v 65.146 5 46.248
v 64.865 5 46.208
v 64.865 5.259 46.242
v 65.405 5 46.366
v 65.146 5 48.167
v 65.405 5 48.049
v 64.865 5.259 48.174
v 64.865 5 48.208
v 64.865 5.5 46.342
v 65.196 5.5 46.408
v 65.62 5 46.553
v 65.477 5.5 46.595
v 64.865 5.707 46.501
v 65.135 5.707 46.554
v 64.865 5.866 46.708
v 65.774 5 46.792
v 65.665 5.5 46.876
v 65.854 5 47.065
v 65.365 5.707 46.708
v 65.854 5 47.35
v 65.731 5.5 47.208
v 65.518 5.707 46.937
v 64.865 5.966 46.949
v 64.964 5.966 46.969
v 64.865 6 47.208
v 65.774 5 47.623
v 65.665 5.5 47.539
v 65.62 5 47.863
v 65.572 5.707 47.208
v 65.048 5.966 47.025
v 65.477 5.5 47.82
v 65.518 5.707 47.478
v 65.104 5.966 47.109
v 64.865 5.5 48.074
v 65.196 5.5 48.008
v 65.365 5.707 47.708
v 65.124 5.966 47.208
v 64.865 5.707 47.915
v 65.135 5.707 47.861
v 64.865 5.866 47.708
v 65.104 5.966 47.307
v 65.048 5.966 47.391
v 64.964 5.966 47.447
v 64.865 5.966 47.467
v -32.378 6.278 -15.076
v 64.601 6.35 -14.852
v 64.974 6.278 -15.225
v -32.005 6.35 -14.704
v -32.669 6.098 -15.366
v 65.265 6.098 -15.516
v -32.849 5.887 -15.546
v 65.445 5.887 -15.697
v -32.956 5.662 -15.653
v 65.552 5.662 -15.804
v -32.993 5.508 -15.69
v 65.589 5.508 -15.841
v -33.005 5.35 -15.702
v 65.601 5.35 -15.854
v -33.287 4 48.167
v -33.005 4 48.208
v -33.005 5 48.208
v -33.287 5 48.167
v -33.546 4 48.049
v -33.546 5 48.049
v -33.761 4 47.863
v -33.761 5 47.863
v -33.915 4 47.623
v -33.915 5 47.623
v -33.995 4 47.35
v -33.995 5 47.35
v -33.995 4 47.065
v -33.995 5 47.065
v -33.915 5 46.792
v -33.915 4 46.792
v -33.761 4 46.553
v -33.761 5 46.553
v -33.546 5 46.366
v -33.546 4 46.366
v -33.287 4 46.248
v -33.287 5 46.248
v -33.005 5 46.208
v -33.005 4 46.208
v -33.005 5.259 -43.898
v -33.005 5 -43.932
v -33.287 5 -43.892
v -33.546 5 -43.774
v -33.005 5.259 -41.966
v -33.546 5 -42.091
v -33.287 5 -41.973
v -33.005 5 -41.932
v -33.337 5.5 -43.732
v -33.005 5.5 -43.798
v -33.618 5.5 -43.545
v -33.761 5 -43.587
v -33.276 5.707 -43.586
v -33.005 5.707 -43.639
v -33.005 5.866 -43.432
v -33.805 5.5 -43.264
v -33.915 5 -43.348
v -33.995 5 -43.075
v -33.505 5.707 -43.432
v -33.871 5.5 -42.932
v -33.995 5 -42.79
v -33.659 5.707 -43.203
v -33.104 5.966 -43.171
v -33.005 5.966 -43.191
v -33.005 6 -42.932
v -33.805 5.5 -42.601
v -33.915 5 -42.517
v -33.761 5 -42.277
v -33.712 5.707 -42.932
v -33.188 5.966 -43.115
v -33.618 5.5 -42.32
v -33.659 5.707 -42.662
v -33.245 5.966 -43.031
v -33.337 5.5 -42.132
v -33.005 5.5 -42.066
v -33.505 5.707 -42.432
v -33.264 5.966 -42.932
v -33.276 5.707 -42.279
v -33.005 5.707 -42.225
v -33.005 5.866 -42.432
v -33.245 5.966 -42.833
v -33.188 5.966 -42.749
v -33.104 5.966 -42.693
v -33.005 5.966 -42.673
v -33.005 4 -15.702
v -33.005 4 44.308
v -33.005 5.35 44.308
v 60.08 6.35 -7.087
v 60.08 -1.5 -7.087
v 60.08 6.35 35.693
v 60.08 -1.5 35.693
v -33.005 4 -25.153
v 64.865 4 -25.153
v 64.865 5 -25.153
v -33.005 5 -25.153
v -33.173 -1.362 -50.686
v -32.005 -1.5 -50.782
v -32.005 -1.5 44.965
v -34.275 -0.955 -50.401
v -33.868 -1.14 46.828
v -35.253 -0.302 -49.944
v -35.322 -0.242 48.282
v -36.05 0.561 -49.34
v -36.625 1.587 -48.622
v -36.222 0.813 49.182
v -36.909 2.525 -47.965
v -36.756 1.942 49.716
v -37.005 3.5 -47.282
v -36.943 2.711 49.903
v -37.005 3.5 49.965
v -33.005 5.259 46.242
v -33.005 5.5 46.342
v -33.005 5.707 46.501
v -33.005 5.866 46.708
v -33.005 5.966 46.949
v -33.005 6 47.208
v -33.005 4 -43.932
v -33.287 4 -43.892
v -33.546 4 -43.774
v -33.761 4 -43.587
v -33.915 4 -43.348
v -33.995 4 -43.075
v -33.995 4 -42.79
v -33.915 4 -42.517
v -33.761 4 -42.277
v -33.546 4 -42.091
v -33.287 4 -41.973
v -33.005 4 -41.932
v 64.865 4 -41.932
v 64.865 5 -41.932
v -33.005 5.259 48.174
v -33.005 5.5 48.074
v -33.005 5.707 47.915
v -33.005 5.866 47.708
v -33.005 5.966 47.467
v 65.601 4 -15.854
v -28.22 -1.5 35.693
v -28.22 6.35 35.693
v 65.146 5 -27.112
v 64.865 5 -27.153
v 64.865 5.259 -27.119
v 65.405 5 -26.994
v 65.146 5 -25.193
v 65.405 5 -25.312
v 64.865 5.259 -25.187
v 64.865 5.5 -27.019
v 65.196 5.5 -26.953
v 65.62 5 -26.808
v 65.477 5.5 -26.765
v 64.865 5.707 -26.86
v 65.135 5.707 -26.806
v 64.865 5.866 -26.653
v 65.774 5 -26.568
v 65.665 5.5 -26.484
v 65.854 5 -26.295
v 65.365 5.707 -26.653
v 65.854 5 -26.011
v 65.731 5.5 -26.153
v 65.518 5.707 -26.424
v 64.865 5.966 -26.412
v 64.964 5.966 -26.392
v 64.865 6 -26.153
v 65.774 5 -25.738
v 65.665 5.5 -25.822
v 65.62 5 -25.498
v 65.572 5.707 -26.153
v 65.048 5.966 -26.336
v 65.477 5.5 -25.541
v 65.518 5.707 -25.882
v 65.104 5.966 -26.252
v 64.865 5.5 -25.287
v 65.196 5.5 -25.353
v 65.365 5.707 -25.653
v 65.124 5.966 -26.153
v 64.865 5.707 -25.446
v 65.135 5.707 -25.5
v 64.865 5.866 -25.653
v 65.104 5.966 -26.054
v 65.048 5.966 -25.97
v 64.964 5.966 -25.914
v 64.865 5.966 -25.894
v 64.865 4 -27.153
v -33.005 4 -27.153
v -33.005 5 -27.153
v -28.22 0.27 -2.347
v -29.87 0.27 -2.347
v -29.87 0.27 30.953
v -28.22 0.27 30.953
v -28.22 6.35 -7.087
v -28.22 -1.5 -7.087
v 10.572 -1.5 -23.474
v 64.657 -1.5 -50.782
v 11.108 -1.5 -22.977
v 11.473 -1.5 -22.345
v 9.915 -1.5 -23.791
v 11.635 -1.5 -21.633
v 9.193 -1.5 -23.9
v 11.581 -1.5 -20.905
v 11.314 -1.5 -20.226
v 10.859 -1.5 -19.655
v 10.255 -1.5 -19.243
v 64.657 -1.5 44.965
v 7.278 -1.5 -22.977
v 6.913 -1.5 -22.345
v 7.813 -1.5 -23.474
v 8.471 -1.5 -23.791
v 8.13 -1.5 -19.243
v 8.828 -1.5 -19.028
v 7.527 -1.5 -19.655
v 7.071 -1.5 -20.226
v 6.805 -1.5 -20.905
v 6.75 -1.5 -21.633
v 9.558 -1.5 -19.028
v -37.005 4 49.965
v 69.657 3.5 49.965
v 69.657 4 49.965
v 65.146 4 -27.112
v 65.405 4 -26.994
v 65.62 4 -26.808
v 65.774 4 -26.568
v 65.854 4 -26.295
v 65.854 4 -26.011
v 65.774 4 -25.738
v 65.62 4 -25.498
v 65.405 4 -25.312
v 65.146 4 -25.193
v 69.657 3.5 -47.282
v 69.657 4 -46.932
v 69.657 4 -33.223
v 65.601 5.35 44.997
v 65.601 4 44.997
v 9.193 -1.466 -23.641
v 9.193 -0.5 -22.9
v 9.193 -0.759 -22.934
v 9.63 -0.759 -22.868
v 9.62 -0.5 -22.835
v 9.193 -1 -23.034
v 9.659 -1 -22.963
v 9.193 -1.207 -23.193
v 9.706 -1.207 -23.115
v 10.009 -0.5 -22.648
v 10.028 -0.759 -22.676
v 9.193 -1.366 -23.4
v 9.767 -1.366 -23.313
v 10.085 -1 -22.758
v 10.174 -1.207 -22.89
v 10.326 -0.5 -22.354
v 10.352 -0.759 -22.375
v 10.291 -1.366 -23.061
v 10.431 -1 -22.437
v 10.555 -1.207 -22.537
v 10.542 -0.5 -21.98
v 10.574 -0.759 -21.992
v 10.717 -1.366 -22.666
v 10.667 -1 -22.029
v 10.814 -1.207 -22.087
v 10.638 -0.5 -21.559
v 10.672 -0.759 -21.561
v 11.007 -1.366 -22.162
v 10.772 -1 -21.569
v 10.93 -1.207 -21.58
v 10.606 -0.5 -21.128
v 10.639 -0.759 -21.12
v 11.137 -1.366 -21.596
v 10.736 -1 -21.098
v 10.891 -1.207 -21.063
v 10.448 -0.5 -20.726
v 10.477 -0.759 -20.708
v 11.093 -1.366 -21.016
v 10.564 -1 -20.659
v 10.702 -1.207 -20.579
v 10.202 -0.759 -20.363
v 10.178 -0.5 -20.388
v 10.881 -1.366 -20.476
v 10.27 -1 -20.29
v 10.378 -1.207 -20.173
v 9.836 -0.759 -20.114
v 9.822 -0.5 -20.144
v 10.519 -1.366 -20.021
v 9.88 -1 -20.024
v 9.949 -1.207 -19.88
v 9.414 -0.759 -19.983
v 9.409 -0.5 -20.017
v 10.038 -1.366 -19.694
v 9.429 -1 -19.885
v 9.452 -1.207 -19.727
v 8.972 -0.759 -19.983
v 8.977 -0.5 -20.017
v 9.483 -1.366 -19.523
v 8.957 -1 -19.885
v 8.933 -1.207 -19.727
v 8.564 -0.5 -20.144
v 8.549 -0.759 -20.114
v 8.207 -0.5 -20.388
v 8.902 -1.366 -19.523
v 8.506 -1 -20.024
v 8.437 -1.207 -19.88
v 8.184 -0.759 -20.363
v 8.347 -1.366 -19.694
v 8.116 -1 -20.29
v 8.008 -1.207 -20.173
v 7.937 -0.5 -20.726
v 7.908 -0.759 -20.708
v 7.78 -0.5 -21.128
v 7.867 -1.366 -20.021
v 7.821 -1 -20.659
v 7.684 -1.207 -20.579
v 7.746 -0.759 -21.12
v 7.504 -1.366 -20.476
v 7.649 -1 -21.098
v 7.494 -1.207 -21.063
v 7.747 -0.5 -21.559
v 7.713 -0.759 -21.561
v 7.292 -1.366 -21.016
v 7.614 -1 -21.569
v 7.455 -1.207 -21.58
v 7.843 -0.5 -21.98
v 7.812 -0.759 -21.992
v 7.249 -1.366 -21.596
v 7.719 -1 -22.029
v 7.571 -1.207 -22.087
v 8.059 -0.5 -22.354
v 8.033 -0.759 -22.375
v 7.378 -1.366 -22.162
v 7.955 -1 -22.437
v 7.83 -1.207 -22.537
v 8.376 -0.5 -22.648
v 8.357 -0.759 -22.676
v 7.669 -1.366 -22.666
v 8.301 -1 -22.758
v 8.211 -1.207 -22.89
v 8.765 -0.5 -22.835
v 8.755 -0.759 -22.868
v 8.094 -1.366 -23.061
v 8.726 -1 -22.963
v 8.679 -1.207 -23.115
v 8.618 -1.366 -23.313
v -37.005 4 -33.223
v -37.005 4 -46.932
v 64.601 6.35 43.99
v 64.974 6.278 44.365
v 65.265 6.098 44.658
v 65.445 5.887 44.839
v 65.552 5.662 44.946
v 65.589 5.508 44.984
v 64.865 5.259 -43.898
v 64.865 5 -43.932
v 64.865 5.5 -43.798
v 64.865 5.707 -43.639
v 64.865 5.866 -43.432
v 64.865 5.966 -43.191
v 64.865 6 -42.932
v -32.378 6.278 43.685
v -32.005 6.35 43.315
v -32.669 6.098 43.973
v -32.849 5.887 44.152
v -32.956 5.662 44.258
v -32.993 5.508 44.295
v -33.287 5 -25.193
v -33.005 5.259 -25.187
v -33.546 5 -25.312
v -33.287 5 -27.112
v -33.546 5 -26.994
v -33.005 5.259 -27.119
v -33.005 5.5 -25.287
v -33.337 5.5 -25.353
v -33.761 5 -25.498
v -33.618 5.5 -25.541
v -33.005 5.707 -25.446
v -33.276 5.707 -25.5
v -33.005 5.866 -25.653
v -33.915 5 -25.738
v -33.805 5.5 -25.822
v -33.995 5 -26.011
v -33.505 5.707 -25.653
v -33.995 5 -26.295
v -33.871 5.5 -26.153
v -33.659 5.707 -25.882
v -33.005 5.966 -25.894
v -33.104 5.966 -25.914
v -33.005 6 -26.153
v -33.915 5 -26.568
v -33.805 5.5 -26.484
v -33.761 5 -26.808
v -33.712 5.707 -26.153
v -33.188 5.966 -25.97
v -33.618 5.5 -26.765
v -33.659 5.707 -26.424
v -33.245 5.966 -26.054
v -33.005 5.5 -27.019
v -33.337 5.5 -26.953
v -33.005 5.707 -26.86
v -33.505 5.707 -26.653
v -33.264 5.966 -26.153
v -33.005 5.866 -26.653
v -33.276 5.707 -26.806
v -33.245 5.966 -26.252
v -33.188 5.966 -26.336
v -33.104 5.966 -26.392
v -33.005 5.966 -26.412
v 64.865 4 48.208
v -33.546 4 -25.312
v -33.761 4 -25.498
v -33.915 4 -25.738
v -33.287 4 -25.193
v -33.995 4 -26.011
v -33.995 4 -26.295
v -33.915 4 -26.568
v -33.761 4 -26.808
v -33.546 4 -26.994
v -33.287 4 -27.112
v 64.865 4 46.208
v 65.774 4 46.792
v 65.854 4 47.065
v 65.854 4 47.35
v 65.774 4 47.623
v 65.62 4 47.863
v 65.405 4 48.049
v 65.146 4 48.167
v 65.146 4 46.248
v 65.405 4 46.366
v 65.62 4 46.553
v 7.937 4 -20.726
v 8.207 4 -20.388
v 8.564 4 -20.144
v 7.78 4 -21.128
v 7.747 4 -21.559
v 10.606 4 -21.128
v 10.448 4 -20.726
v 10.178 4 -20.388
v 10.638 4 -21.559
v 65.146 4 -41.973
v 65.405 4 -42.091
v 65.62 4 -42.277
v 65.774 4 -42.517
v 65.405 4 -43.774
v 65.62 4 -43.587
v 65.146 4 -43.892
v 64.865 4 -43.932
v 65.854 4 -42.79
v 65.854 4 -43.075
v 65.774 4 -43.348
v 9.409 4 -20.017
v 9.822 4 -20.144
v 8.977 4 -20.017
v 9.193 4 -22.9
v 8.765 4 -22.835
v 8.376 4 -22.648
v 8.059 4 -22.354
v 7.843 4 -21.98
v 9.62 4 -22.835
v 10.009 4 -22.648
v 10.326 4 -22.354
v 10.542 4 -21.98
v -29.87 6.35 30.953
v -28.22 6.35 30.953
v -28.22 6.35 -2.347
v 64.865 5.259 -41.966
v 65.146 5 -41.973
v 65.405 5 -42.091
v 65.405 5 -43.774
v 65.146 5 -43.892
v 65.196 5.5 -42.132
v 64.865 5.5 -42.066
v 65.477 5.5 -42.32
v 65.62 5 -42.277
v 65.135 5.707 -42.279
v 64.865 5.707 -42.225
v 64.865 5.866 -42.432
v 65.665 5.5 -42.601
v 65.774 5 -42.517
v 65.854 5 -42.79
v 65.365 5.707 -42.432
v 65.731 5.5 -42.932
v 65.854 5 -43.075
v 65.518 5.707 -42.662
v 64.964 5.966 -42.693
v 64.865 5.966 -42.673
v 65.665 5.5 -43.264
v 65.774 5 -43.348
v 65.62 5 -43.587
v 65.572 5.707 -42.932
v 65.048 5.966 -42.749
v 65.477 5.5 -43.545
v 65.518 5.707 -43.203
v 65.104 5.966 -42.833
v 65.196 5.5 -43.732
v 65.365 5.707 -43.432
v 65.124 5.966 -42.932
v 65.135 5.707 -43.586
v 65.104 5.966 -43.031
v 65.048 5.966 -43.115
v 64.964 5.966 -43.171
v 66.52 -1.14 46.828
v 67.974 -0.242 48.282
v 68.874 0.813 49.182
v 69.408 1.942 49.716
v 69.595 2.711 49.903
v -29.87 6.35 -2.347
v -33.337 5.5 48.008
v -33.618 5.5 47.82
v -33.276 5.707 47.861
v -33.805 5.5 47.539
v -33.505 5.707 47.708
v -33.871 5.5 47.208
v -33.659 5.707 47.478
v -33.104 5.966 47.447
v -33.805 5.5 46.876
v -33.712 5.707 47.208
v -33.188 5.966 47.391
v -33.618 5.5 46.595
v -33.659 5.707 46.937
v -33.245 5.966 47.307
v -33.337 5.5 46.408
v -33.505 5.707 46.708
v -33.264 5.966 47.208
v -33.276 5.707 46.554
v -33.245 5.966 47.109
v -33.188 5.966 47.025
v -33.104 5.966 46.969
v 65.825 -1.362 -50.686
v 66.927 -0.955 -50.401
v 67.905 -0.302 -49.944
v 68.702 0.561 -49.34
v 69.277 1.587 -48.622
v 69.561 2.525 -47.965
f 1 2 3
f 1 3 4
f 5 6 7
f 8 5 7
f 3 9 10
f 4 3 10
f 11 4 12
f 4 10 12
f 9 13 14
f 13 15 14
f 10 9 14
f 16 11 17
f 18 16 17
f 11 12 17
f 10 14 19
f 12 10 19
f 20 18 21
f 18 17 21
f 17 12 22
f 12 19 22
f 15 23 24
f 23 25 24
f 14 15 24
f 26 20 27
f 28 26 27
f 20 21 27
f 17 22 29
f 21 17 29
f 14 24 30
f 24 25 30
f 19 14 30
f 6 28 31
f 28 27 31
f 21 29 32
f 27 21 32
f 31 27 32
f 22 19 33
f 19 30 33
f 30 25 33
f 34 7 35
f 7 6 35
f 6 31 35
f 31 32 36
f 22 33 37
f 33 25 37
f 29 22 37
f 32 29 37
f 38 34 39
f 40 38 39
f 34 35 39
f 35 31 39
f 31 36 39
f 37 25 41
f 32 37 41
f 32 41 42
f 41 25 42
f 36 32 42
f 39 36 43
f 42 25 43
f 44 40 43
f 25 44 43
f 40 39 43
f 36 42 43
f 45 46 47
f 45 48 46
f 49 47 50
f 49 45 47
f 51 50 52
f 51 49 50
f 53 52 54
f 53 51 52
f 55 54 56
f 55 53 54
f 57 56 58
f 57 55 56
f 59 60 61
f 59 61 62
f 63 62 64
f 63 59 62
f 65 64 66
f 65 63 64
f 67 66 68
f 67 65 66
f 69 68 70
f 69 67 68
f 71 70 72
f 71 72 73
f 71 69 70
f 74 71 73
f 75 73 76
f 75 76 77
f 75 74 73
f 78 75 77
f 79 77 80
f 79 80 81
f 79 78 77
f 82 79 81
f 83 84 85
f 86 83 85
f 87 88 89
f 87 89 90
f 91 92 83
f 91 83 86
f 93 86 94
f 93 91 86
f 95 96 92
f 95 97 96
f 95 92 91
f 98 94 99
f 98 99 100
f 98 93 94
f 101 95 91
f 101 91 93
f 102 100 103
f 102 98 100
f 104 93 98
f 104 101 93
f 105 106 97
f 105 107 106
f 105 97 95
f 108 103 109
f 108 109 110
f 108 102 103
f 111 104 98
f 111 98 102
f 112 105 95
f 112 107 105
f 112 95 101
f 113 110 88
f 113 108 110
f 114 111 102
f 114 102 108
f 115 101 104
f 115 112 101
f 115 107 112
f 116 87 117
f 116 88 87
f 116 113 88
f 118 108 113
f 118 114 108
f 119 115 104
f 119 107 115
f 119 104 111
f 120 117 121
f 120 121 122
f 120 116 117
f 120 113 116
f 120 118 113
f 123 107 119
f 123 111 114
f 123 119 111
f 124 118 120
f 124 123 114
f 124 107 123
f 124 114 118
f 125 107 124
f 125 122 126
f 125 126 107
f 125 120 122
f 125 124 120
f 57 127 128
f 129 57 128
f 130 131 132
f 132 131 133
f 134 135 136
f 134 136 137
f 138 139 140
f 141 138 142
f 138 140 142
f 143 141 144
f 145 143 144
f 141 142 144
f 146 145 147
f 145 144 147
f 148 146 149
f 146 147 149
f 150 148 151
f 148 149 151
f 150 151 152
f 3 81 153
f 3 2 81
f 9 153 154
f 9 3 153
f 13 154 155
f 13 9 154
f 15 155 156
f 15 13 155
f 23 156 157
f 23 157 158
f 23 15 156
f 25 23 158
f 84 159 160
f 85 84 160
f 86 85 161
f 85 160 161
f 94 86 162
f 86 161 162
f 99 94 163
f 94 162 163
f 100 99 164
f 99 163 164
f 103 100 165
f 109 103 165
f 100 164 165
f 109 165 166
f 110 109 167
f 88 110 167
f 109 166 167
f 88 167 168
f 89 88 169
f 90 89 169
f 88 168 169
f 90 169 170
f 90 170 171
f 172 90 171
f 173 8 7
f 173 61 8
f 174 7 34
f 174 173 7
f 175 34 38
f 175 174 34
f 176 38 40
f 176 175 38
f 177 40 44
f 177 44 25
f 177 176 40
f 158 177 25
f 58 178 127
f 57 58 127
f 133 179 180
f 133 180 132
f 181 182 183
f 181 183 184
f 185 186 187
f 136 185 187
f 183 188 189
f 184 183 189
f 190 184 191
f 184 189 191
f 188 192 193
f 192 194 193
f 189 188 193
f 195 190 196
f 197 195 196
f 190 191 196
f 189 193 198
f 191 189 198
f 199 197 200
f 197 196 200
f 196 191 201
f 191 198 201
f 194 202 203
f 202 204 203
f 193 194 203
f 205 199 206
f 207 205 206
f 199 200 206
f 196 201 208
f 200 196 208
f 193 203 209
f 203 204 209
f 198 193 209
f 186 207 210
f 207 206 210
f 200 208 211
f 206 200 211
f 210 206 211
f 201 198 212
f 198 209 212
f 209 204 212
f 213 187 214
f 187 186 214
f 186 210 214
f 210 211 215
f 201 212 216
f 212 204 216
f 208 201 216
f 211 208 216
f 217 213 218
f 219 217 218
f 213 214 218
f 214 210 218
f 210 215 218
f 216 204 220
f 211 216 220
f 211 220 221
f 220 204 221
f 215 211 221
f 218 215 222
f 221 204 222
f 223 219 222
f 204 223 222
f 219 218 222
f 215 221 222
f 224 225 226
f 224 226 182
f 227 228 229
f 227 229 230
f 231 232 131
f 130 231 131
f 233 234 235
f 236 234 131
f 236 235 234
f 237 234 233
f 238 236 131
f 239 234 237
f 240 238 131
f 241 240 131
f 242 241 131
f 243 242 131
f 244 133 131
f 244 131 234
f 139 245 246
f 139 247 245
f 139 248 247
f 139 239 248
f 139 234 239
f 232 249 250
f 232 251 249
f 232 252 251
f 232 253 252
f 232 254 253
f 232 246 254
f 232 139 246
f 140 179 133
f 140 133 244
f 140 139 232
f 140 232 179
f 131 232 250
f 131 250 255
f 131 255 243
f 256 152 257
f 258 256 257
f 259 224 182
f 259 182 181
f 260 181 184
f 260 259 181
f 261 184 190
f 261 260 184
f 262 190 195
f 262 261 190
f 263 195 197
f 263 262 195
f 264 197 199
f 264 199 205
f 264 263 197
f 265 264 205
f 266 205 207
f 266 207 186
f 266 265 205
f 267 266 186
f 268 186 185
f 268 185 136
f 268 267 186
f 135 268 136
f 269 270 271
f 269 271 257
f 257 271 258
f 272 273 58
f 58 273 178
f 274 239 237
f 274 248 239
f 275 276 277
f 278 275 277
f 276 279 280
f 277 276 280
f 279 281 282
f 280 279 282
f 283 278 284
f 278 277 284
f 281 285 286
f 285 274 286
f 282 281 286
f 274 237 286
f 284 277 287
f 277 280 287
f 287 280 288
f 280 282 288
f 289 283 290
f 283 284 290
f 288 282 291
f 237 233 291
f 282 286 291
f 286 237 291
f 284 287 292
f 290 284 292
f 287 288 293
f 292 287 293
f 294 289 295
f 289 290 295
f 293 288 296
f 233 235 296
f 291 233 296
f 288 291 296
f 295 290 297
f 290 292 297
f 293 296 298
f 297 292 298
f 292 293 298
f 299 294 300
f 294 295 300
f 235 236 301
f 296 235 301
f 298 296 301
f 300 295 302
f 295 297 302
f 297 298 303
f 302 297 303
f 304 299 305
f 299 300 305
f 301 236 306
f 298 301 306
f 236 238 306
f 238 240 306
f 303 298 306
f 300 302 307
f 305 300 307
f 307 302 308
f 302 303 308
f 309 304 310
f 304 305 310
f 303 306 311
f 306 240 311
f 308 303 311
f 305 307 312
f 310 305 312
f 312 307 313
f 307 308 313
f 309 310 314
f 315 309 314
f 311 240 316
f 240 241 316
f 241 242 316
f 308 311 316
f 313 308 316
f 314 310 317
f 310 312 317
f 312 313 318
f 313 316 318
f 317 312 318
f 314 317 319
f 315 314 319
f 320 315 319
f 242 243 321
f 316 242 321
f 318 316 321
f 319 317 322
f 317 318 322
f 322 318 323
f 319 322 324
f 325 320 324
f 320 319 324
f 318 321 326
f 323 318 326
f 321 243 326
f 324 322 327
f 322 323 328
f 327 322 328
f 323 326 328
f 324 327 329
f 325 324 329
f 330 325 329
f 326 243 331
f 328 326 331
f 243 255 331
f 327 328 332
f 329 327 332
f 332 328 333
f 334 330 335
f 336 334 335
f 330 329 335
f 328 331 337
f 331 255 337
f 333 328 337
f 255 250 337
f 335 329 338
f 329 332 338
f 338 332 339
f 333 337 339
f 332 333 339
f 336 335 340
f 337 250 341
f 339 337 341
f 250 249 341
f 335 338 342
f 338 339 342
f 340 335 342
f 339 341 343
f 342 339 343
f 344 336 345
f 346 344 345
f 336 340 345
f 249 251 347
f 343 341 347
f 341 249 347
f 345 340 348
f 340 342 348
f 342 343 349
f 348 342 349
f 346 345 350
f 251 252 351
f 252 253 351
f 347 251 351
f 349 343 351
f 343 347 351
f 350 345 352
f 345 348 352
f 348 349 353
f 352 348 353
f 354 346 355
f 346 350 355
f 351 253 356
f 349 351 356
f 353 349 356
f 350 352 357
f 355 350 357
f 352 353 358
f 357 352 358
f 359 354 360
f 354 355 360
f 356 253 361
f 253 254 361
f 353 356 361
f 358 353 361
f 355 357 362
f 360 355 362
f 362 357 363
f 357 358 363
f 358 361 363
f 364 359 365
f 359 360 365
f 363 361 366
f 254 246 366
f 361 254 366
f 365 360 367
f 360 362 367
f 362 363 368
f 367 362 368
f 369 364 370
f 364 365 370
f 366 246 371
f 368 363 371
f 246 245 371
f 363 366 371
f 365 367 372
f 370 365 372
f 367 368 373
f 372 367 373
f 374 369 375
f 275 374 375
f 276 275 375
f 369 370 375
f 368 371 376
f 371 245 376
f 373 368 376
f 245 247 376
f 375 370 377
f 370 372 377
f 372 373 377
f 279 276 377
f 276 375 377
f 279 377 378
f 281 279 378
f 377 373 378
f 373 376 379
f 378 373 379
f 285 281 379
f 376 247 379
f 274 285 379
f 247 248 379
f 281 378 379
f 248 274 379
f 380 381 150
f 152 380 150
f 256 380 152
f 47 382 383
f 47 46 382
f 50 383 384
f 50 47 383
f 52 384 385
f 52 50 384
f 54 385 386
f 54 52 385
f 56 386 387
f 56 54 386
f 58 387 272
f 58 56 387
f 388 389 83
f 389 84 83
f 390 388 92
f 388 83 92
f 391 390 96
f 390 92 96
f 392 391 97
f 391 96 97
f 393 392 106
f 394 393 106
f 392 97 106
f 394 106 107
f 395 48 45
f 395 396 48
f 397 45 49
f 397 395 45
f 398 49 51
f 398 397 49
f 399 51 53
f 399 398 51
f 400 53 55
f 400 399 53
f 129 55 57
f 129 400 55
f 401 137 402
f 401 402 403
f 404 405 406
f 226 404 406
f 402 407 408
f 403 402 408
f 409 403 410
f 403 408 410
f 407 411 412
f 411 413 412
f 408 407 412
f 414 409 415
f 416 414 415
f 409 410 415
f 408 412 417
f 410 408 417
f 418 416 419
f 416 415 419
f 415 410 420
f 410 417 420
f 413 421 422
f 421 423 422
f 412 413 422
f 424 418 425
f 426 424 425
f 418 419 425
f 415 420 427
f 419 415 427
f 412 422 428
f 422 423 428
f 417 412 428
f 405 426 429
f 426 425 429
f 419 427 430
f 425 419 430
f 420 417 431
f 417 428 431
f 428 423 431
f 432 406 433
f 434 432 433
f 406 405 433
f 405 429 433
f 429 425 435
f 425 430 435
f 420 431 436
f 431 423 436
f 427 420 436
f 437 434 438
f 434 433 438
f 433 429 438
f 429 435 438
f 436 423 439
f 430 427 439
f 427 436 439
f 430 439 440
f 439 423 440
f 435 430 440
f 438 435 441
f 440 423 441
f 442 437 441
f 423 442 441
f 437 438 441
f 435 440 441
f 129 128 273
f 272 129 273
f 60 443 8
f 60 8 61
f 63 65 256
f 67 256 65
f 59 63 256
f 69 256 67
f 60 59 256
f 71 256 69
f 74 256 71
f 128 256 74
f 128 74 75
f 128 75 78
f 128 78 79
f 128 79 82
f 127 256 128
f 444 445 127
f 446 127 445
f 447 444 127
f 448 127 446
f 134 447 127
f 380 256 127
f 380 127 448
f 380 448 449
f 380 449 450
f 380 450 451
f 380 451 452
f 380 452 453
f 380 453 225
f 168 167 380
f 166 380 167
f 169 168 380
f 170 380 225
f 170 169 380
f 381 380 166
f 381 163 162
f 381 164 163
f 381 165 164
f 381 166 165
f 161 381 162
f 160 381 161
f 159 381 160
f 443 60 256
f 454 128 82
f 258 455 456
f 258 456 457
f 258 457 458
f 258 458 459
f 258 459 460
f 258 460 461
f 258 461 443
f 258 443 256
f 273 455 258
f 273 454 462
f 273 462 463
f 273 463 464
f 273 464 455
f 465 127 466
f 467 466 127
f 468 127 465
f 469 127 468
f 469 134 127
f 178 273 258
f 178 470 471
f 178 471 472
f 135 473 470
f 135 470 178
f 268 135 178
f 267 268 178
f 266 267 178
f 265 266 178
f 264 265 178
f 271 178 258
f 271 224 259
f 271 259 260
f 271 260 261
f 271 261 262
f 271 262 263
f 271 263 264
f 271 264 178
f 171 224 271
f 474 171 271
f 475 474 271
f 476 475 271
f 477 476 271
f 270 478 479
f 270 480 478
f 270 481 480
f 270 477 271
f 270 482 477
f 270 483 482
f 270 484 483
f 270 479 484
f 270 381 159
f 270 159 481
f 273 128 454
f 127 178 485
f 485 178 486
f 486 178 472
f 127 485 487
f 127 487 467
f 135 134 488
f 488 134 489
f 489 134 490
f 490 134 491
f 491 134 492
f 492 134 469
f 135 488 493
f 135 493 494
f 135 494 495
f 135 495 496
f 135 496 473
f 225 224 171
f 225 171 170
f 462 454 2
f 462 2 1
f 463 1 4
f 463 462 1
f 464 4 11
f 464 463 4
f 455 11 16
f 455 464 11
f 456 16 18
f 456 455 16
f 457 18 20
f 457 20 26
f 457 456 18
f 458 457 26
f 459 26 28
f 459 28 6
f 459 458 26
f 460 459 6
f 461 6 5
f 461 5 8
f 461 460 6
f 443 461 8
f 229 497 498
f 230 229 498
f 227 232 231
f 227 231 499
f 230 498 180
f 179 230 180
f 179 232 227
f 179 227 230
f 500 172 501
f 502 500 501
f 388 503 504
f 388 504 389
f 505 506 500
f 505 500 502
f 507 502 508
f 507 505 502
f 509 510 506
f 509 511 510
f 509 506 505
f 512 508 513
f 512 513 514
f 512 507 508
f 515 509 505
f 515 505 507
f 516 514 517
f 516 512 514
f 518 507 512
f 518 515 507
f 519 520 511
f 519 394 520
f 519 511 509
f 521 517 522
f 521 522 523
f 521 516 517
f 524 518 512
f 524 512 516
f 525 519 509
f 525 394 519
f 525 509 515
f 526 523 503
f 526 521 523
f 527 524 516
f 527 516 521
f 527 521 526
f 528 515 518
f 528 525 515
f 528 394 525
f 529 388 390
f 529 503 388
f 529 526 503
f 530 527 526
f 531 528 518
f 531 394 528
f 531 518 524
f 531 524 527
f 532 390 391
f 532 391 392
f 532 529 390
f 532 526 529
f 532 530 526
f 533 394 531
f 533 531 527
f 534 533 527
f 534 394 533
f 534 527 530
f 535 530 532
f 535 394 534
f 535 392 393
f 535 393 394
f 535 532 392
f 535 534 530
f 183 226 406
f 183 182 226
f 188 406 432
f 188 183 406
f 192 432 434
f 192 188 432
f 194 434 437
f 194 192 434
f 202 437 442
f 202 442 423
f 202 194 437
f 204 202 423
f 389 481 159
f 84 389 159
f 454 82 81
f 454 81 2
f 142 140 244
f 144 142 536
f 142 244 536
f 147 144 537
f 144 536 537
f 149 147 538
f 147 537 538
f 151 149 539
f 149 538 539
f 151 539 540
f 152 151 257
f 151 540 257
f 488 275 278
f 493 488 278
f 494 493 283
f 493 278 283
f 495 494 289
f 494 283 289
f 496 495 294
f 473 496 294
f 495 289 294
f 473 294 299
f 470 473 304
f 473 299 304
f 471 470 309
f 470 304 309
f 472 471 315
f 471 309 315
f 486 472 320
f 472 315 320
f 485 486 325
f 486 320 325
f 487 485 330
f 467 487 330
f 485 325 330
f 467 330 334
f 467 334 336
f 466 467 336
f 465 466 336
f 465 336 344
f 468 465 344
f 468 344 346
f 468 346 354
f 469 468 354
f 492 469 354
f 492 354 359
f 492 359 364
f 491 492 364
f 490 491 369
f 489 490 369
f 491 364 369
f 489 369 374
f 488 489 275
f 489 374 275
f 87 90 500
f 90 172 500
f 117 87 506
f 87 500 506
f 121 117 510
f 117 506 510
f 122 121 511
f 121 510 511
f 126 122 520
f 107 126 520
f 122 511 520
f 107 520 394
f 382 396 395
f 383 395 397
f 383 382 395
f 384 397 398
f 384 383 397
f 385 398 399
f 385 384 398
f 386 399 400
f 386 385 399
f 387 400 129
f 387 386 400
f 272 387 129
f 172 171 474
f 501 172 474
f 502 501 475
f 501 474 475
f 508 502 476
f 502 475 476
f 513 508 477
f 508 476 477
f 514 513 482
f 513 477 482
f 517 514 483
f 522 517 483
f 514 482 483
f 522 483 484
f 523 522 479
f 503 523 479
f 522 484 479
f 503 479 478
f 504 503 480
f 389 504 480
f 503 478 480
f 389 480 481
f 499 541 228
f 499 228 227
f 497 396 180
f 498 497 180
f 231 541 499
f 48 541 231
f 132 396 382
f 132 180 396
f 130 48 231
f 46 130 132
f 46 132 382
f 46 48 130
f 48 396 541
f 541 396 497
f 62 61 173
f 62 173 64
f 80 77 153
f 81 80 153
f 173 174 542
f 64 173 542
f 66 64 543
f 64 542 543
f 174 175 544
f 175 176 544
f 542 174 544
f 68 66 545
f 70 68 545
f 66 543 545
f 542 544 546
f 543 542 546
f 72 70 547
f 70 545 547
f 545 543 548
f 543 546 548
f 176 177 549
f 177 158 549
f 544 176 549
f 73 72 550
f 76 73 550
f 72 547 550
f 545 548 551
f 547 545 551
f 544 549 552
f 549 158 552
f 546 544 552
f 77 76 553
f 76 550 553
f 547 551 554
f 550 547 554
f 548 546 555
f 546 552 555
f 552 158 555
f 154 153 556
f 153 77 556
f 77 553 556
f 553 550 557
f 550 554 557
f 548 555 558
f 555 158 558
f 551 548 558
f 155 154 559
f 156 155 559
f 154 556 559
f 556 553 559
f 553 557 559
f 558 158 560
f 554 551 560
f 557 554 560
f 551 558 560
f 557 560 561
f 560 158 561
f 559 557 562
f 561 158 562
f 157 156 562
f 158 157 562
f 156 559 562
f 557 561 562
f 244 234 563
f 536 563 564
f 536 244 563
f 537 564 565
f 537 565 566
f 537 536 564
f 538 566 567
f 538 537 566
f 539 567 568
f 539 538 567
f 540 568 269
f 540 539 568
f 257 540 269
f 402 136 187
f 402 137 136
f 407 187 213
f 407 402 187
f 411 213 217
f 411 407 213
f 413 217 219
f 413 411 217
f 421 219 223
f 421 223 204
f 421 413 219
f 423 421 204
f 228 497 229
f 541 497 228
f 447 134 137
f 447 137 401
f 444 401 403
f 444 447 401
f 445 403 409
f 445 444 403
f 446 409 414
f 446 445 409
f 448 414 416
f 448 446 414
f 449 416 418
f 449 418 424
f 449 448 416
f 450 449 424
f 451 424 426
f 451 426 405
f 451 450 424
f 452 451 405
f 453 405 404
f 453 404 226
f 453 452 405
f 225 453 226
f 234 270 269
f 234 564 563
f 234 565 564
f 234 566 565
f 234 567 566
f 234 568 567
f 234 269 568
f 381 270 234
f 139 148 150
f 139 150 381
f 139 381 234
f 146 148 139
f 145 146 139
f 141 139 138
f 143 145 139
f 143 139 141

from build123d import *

# Parameters (mm, degrees)
SKETCH1_W           = 106.662693993
SKETCH1_H           = 83.18856
SKETCH1_W_2         = 88.3
SKETCH1_H_2         = 42.78
BOSS_EXTRUDE1_DEPTH = 4
SKETCH1_4_W         = 88.3
SKETCH1_4_H         = 42.78
BOSS_EXTRUDE2_DEPTH = 6.35
SKETCH2_R           = 1.449406475
CUT_EXTRUDE1_DEPTH  = 86.959228837
BOSS_EXTRUDE3_DEPTH = 106.662693993
FILLET6_R           = 1
BOSS_EXTRUDE4_DEPTH = 2
FILLET7_R           = 1
SKETCH5_W           = 1.65
SKETCH5_H           = 33.3
CUT_EXTRUDE3_DEPTH  = 6.08
BOSS_EXTRUDE6_START = 1.5
SKETCH10_W          = 106.662693993
SKETCH10_H          = 93.062075056
SKETCH10_R          = 1.449406475
SKETCH10_W_2        = 88.3
SKETCH10_H_2        = 42.78
BOSS_EXTRUDE6_DEPTH = 1.5
BOSS_EXTRUDE7_DEPTH = 106.662693993
FILLET9_R           = 1
FILLET10_R          = 5


with BuildPart() as part:
    # Sketch1 → Boss-Extrude1 (new body)
    with BuildSketch(Plane(origin=(0, 0, 0), x_dir=(1, 0, 0), z_dir=(0, 1, 0))):
        with Locations((16.325985563, -8.370933327)):
            Rectangle(SKETCH1_W, SKETCH1_H)
        with Locations((15.929638567, -14.302731543)):
            Rectangle(SKETCH1_W_2, SKETCH1_H_2, mode=Mode.SUBTRACT)
    extrude(amount=BOSS_EXTRUDE1_DEPTH)

    # Sketch1<4> → Boss-Extrude2 (add)
    with BuildSketch(Plane(origin=(0, 0, 0), x_dir=(1, 0, 0), z_dir=(0, 1, 0))):
        Polygon((-33.005361433, -44.307731543), (65.60133256, -44.996613327), (65.60133256, 15.853526673), (-33.005361433, 15.702268457), align=None)
        with Locations((15.929638567, -14.302731543)):
            Rectangle(SKETCH1_4_W, SKETCH1_4_H, mode=Mode.SUBTRACT)
    extrude(amount=BOSS_EXTRUDE2_DEPTH)

    # Sketch2 → Cut-Extrude1 (cut, through all)
    with BuildSketch(Plane.XZ):
        with Locations(Location((9.192630415, -21.45022355, 0), (0, 0, 270))):
            Circle(SKETCH2_R)
    extrude(amount=-CUT_EXTRUDE1_DEPTH, mode=Mode.SUBTRACT)

    # Sketch3 → Boss-Extrude3 (add)
    with BuildSketch(Plane.ZY.offset(37.005361433)):
        Polygon((-32.832268457, 0), (-49.732268457, 0), (-46.932268457, 4), (-32.832268457, 4), align=None)
    extrude(amount=-BOSS_EXTRUDE3_DEPTH)

    # Fillet6
    fillet6_edges = [part.edges().sort_by_distance(p)[0] for p in [
        (-33.005361433, 6.35, 14.302731543),
        (16.297985564, 6.35, 44.652172435),
        (65.60133256, 6.35, 14.571543327),
        (16.297985564, 6.35, -15.777897565),
    ]]
    fillet(fillet6_edges, radius=FILLET6_R)

    # Sketch4 → Boss-Extrude4 (add)
    with BuildSketch(Plane(origin=(0, 4, 0), x_dir=(1, 0, 0), z_dir=(0, 1, 0))):
        with BuildLine():
            Line((64.864638567, 25.152939827), (-33.005361433, 25.152939827))
            ThreePointArc((-33.005361433, 25.152939827), (-34.005361433, 26.152939827), (-33.005361433, 27.152939827))
            Line((-33.005361433, 27.152939827), (64.864638567, 27.152939827))
            ThreePointArc((64.864638567, 27.152939827), (65.864638567, 26.152939827), (64.864638567, 25.152939827))
        make_face()
        with BuildLine():
            Line((-33.005361433, 41.932268457), (64.864638567, 41.932268457))
            ThreePointArc((64.864638567, 41.932268457), (65.864638567, 42.932268457), (64.864638567, 43.932268457))
            Line((64.864638567, 43.932268457), (-33.005361433, 43.932268457))
            ThreePointArc((-33.005361433, 43.932268457), (-34.005361433, 42.932268457), (-33.005361433, 41.932268457))
        make_face()
        with BuildLine():
            Line((64.864638567, -48.207731543), (-33.005361433, -48.207731543))
            ThreePointArc((-33.005361433, -48.207731543), (-34.005361433, -47.207731543), (-33.005361433, -46.207731543))
            Line((-33.005361433, -46.207731543), (64.864638567, -46.207731543))
            ThreePointArc((64.864638567, -46.207731543), (65.864638567, -47.207731543), (64.864638567, -48.207731543))
        make_face()
    extrude(amount=BOSS_EXTRUDE4_DEPTH)

    # Fillet7
    fillet7_edges = [part.edges().sort_by_distance(p)[0] for p in [
        (65.864638567, 6, -26.152939827),
        (15.929638567, 6, -27.152939827),
        (-34.005361433, 6, -26.152939827),
        (15.929638567, 6, -25.152939827),
        (65.864638567, 6, 47.207731543),
        (15.929638567, 6, 46.207731543),
        (-34.005361433, 6, 47.207731543),
        (15.929638567, 6, 48.207731543),
        (-34.005361433, 6, -42.932268457),
        (15.929638567, 6, -41.932268457),
        (65.864638567, 6, -42.932268457),
        (15.929638567, 6, -43.932268457),
    ]]
    fillet(fillet7_edges, radius=FILLET7_R - 0.0001)  # a hair under: the kernel refuses the full size

    # Sketch5 → Cut-Extrude3 (cut)
    with BuildSketch(Plane(origin=(0, 6.35, 0), x_dir=(1, 0, 0), z_dir=(0, 1, 0))):
        with Locations((-29.045361433, -14.302731543)):
            Rectangle(SKETCH5_W, SKETCH5_H)
    extrude(amount=-CUT_EXTRUDE3_DEPTH, mode=Mode.SUBTRACT)

    # Sketch10 → Boss-Extrude6 (add)
    with BuildSketch(Plane.XZ.offset(BOSS_EXTRUDE6_START)):
        with Locations((16.325985563, 3.434175799)):
            Rectangle(SKETCH10_W, SKETCH10_H)
        with Locations(Location((9.192630415, -21.45022355, 0), (0, 0, 270))):
            Circle(SKETCH10_R, mode=Mode.SUBTRACT)
        with Locations((15.929638567, 14.302731543)):
            Rectangle(SKETCH10_W_2, SKETCH10_H_2, mode=Mode.SUBTRACT)
    extrude(amount=-BOSS_EXTRUDE6_DEPTH)

    # Sketch11 → Boss-Extrude7 (add)
    with BuildSketch(Plane.ZY.offset(37.005361433)):
        Polygon((-49.732268457, 0), (-50.782268457, -1.5), (-43.096861729, -1.5), (-43.096861729, 0), align=None)
    extrude(amount=-BOSS_EXTRUDE7_DEPTH)

    # Fillet9
    fillet9_edges = [part.edges().sort_by_distance(p)[0] for p in [
        (9.192630415, -1.5, -20.000817075),
    ]]
    fillet(fillet9_edges, radius=FILLET9_R)

    # Fillet10
    fillet10_edges = [part.edges().sort_by_distance(p)[0] for p in [
        (-37.005361433, -1.5, -0.408527565),
        (69.65733256, -1.5, -0.408527565),
        (16.325985564, -1.5, 49.965213327),
    ]]
    fillet(fillet10_edges, radius=FILLET10_R)


solid = part.part
